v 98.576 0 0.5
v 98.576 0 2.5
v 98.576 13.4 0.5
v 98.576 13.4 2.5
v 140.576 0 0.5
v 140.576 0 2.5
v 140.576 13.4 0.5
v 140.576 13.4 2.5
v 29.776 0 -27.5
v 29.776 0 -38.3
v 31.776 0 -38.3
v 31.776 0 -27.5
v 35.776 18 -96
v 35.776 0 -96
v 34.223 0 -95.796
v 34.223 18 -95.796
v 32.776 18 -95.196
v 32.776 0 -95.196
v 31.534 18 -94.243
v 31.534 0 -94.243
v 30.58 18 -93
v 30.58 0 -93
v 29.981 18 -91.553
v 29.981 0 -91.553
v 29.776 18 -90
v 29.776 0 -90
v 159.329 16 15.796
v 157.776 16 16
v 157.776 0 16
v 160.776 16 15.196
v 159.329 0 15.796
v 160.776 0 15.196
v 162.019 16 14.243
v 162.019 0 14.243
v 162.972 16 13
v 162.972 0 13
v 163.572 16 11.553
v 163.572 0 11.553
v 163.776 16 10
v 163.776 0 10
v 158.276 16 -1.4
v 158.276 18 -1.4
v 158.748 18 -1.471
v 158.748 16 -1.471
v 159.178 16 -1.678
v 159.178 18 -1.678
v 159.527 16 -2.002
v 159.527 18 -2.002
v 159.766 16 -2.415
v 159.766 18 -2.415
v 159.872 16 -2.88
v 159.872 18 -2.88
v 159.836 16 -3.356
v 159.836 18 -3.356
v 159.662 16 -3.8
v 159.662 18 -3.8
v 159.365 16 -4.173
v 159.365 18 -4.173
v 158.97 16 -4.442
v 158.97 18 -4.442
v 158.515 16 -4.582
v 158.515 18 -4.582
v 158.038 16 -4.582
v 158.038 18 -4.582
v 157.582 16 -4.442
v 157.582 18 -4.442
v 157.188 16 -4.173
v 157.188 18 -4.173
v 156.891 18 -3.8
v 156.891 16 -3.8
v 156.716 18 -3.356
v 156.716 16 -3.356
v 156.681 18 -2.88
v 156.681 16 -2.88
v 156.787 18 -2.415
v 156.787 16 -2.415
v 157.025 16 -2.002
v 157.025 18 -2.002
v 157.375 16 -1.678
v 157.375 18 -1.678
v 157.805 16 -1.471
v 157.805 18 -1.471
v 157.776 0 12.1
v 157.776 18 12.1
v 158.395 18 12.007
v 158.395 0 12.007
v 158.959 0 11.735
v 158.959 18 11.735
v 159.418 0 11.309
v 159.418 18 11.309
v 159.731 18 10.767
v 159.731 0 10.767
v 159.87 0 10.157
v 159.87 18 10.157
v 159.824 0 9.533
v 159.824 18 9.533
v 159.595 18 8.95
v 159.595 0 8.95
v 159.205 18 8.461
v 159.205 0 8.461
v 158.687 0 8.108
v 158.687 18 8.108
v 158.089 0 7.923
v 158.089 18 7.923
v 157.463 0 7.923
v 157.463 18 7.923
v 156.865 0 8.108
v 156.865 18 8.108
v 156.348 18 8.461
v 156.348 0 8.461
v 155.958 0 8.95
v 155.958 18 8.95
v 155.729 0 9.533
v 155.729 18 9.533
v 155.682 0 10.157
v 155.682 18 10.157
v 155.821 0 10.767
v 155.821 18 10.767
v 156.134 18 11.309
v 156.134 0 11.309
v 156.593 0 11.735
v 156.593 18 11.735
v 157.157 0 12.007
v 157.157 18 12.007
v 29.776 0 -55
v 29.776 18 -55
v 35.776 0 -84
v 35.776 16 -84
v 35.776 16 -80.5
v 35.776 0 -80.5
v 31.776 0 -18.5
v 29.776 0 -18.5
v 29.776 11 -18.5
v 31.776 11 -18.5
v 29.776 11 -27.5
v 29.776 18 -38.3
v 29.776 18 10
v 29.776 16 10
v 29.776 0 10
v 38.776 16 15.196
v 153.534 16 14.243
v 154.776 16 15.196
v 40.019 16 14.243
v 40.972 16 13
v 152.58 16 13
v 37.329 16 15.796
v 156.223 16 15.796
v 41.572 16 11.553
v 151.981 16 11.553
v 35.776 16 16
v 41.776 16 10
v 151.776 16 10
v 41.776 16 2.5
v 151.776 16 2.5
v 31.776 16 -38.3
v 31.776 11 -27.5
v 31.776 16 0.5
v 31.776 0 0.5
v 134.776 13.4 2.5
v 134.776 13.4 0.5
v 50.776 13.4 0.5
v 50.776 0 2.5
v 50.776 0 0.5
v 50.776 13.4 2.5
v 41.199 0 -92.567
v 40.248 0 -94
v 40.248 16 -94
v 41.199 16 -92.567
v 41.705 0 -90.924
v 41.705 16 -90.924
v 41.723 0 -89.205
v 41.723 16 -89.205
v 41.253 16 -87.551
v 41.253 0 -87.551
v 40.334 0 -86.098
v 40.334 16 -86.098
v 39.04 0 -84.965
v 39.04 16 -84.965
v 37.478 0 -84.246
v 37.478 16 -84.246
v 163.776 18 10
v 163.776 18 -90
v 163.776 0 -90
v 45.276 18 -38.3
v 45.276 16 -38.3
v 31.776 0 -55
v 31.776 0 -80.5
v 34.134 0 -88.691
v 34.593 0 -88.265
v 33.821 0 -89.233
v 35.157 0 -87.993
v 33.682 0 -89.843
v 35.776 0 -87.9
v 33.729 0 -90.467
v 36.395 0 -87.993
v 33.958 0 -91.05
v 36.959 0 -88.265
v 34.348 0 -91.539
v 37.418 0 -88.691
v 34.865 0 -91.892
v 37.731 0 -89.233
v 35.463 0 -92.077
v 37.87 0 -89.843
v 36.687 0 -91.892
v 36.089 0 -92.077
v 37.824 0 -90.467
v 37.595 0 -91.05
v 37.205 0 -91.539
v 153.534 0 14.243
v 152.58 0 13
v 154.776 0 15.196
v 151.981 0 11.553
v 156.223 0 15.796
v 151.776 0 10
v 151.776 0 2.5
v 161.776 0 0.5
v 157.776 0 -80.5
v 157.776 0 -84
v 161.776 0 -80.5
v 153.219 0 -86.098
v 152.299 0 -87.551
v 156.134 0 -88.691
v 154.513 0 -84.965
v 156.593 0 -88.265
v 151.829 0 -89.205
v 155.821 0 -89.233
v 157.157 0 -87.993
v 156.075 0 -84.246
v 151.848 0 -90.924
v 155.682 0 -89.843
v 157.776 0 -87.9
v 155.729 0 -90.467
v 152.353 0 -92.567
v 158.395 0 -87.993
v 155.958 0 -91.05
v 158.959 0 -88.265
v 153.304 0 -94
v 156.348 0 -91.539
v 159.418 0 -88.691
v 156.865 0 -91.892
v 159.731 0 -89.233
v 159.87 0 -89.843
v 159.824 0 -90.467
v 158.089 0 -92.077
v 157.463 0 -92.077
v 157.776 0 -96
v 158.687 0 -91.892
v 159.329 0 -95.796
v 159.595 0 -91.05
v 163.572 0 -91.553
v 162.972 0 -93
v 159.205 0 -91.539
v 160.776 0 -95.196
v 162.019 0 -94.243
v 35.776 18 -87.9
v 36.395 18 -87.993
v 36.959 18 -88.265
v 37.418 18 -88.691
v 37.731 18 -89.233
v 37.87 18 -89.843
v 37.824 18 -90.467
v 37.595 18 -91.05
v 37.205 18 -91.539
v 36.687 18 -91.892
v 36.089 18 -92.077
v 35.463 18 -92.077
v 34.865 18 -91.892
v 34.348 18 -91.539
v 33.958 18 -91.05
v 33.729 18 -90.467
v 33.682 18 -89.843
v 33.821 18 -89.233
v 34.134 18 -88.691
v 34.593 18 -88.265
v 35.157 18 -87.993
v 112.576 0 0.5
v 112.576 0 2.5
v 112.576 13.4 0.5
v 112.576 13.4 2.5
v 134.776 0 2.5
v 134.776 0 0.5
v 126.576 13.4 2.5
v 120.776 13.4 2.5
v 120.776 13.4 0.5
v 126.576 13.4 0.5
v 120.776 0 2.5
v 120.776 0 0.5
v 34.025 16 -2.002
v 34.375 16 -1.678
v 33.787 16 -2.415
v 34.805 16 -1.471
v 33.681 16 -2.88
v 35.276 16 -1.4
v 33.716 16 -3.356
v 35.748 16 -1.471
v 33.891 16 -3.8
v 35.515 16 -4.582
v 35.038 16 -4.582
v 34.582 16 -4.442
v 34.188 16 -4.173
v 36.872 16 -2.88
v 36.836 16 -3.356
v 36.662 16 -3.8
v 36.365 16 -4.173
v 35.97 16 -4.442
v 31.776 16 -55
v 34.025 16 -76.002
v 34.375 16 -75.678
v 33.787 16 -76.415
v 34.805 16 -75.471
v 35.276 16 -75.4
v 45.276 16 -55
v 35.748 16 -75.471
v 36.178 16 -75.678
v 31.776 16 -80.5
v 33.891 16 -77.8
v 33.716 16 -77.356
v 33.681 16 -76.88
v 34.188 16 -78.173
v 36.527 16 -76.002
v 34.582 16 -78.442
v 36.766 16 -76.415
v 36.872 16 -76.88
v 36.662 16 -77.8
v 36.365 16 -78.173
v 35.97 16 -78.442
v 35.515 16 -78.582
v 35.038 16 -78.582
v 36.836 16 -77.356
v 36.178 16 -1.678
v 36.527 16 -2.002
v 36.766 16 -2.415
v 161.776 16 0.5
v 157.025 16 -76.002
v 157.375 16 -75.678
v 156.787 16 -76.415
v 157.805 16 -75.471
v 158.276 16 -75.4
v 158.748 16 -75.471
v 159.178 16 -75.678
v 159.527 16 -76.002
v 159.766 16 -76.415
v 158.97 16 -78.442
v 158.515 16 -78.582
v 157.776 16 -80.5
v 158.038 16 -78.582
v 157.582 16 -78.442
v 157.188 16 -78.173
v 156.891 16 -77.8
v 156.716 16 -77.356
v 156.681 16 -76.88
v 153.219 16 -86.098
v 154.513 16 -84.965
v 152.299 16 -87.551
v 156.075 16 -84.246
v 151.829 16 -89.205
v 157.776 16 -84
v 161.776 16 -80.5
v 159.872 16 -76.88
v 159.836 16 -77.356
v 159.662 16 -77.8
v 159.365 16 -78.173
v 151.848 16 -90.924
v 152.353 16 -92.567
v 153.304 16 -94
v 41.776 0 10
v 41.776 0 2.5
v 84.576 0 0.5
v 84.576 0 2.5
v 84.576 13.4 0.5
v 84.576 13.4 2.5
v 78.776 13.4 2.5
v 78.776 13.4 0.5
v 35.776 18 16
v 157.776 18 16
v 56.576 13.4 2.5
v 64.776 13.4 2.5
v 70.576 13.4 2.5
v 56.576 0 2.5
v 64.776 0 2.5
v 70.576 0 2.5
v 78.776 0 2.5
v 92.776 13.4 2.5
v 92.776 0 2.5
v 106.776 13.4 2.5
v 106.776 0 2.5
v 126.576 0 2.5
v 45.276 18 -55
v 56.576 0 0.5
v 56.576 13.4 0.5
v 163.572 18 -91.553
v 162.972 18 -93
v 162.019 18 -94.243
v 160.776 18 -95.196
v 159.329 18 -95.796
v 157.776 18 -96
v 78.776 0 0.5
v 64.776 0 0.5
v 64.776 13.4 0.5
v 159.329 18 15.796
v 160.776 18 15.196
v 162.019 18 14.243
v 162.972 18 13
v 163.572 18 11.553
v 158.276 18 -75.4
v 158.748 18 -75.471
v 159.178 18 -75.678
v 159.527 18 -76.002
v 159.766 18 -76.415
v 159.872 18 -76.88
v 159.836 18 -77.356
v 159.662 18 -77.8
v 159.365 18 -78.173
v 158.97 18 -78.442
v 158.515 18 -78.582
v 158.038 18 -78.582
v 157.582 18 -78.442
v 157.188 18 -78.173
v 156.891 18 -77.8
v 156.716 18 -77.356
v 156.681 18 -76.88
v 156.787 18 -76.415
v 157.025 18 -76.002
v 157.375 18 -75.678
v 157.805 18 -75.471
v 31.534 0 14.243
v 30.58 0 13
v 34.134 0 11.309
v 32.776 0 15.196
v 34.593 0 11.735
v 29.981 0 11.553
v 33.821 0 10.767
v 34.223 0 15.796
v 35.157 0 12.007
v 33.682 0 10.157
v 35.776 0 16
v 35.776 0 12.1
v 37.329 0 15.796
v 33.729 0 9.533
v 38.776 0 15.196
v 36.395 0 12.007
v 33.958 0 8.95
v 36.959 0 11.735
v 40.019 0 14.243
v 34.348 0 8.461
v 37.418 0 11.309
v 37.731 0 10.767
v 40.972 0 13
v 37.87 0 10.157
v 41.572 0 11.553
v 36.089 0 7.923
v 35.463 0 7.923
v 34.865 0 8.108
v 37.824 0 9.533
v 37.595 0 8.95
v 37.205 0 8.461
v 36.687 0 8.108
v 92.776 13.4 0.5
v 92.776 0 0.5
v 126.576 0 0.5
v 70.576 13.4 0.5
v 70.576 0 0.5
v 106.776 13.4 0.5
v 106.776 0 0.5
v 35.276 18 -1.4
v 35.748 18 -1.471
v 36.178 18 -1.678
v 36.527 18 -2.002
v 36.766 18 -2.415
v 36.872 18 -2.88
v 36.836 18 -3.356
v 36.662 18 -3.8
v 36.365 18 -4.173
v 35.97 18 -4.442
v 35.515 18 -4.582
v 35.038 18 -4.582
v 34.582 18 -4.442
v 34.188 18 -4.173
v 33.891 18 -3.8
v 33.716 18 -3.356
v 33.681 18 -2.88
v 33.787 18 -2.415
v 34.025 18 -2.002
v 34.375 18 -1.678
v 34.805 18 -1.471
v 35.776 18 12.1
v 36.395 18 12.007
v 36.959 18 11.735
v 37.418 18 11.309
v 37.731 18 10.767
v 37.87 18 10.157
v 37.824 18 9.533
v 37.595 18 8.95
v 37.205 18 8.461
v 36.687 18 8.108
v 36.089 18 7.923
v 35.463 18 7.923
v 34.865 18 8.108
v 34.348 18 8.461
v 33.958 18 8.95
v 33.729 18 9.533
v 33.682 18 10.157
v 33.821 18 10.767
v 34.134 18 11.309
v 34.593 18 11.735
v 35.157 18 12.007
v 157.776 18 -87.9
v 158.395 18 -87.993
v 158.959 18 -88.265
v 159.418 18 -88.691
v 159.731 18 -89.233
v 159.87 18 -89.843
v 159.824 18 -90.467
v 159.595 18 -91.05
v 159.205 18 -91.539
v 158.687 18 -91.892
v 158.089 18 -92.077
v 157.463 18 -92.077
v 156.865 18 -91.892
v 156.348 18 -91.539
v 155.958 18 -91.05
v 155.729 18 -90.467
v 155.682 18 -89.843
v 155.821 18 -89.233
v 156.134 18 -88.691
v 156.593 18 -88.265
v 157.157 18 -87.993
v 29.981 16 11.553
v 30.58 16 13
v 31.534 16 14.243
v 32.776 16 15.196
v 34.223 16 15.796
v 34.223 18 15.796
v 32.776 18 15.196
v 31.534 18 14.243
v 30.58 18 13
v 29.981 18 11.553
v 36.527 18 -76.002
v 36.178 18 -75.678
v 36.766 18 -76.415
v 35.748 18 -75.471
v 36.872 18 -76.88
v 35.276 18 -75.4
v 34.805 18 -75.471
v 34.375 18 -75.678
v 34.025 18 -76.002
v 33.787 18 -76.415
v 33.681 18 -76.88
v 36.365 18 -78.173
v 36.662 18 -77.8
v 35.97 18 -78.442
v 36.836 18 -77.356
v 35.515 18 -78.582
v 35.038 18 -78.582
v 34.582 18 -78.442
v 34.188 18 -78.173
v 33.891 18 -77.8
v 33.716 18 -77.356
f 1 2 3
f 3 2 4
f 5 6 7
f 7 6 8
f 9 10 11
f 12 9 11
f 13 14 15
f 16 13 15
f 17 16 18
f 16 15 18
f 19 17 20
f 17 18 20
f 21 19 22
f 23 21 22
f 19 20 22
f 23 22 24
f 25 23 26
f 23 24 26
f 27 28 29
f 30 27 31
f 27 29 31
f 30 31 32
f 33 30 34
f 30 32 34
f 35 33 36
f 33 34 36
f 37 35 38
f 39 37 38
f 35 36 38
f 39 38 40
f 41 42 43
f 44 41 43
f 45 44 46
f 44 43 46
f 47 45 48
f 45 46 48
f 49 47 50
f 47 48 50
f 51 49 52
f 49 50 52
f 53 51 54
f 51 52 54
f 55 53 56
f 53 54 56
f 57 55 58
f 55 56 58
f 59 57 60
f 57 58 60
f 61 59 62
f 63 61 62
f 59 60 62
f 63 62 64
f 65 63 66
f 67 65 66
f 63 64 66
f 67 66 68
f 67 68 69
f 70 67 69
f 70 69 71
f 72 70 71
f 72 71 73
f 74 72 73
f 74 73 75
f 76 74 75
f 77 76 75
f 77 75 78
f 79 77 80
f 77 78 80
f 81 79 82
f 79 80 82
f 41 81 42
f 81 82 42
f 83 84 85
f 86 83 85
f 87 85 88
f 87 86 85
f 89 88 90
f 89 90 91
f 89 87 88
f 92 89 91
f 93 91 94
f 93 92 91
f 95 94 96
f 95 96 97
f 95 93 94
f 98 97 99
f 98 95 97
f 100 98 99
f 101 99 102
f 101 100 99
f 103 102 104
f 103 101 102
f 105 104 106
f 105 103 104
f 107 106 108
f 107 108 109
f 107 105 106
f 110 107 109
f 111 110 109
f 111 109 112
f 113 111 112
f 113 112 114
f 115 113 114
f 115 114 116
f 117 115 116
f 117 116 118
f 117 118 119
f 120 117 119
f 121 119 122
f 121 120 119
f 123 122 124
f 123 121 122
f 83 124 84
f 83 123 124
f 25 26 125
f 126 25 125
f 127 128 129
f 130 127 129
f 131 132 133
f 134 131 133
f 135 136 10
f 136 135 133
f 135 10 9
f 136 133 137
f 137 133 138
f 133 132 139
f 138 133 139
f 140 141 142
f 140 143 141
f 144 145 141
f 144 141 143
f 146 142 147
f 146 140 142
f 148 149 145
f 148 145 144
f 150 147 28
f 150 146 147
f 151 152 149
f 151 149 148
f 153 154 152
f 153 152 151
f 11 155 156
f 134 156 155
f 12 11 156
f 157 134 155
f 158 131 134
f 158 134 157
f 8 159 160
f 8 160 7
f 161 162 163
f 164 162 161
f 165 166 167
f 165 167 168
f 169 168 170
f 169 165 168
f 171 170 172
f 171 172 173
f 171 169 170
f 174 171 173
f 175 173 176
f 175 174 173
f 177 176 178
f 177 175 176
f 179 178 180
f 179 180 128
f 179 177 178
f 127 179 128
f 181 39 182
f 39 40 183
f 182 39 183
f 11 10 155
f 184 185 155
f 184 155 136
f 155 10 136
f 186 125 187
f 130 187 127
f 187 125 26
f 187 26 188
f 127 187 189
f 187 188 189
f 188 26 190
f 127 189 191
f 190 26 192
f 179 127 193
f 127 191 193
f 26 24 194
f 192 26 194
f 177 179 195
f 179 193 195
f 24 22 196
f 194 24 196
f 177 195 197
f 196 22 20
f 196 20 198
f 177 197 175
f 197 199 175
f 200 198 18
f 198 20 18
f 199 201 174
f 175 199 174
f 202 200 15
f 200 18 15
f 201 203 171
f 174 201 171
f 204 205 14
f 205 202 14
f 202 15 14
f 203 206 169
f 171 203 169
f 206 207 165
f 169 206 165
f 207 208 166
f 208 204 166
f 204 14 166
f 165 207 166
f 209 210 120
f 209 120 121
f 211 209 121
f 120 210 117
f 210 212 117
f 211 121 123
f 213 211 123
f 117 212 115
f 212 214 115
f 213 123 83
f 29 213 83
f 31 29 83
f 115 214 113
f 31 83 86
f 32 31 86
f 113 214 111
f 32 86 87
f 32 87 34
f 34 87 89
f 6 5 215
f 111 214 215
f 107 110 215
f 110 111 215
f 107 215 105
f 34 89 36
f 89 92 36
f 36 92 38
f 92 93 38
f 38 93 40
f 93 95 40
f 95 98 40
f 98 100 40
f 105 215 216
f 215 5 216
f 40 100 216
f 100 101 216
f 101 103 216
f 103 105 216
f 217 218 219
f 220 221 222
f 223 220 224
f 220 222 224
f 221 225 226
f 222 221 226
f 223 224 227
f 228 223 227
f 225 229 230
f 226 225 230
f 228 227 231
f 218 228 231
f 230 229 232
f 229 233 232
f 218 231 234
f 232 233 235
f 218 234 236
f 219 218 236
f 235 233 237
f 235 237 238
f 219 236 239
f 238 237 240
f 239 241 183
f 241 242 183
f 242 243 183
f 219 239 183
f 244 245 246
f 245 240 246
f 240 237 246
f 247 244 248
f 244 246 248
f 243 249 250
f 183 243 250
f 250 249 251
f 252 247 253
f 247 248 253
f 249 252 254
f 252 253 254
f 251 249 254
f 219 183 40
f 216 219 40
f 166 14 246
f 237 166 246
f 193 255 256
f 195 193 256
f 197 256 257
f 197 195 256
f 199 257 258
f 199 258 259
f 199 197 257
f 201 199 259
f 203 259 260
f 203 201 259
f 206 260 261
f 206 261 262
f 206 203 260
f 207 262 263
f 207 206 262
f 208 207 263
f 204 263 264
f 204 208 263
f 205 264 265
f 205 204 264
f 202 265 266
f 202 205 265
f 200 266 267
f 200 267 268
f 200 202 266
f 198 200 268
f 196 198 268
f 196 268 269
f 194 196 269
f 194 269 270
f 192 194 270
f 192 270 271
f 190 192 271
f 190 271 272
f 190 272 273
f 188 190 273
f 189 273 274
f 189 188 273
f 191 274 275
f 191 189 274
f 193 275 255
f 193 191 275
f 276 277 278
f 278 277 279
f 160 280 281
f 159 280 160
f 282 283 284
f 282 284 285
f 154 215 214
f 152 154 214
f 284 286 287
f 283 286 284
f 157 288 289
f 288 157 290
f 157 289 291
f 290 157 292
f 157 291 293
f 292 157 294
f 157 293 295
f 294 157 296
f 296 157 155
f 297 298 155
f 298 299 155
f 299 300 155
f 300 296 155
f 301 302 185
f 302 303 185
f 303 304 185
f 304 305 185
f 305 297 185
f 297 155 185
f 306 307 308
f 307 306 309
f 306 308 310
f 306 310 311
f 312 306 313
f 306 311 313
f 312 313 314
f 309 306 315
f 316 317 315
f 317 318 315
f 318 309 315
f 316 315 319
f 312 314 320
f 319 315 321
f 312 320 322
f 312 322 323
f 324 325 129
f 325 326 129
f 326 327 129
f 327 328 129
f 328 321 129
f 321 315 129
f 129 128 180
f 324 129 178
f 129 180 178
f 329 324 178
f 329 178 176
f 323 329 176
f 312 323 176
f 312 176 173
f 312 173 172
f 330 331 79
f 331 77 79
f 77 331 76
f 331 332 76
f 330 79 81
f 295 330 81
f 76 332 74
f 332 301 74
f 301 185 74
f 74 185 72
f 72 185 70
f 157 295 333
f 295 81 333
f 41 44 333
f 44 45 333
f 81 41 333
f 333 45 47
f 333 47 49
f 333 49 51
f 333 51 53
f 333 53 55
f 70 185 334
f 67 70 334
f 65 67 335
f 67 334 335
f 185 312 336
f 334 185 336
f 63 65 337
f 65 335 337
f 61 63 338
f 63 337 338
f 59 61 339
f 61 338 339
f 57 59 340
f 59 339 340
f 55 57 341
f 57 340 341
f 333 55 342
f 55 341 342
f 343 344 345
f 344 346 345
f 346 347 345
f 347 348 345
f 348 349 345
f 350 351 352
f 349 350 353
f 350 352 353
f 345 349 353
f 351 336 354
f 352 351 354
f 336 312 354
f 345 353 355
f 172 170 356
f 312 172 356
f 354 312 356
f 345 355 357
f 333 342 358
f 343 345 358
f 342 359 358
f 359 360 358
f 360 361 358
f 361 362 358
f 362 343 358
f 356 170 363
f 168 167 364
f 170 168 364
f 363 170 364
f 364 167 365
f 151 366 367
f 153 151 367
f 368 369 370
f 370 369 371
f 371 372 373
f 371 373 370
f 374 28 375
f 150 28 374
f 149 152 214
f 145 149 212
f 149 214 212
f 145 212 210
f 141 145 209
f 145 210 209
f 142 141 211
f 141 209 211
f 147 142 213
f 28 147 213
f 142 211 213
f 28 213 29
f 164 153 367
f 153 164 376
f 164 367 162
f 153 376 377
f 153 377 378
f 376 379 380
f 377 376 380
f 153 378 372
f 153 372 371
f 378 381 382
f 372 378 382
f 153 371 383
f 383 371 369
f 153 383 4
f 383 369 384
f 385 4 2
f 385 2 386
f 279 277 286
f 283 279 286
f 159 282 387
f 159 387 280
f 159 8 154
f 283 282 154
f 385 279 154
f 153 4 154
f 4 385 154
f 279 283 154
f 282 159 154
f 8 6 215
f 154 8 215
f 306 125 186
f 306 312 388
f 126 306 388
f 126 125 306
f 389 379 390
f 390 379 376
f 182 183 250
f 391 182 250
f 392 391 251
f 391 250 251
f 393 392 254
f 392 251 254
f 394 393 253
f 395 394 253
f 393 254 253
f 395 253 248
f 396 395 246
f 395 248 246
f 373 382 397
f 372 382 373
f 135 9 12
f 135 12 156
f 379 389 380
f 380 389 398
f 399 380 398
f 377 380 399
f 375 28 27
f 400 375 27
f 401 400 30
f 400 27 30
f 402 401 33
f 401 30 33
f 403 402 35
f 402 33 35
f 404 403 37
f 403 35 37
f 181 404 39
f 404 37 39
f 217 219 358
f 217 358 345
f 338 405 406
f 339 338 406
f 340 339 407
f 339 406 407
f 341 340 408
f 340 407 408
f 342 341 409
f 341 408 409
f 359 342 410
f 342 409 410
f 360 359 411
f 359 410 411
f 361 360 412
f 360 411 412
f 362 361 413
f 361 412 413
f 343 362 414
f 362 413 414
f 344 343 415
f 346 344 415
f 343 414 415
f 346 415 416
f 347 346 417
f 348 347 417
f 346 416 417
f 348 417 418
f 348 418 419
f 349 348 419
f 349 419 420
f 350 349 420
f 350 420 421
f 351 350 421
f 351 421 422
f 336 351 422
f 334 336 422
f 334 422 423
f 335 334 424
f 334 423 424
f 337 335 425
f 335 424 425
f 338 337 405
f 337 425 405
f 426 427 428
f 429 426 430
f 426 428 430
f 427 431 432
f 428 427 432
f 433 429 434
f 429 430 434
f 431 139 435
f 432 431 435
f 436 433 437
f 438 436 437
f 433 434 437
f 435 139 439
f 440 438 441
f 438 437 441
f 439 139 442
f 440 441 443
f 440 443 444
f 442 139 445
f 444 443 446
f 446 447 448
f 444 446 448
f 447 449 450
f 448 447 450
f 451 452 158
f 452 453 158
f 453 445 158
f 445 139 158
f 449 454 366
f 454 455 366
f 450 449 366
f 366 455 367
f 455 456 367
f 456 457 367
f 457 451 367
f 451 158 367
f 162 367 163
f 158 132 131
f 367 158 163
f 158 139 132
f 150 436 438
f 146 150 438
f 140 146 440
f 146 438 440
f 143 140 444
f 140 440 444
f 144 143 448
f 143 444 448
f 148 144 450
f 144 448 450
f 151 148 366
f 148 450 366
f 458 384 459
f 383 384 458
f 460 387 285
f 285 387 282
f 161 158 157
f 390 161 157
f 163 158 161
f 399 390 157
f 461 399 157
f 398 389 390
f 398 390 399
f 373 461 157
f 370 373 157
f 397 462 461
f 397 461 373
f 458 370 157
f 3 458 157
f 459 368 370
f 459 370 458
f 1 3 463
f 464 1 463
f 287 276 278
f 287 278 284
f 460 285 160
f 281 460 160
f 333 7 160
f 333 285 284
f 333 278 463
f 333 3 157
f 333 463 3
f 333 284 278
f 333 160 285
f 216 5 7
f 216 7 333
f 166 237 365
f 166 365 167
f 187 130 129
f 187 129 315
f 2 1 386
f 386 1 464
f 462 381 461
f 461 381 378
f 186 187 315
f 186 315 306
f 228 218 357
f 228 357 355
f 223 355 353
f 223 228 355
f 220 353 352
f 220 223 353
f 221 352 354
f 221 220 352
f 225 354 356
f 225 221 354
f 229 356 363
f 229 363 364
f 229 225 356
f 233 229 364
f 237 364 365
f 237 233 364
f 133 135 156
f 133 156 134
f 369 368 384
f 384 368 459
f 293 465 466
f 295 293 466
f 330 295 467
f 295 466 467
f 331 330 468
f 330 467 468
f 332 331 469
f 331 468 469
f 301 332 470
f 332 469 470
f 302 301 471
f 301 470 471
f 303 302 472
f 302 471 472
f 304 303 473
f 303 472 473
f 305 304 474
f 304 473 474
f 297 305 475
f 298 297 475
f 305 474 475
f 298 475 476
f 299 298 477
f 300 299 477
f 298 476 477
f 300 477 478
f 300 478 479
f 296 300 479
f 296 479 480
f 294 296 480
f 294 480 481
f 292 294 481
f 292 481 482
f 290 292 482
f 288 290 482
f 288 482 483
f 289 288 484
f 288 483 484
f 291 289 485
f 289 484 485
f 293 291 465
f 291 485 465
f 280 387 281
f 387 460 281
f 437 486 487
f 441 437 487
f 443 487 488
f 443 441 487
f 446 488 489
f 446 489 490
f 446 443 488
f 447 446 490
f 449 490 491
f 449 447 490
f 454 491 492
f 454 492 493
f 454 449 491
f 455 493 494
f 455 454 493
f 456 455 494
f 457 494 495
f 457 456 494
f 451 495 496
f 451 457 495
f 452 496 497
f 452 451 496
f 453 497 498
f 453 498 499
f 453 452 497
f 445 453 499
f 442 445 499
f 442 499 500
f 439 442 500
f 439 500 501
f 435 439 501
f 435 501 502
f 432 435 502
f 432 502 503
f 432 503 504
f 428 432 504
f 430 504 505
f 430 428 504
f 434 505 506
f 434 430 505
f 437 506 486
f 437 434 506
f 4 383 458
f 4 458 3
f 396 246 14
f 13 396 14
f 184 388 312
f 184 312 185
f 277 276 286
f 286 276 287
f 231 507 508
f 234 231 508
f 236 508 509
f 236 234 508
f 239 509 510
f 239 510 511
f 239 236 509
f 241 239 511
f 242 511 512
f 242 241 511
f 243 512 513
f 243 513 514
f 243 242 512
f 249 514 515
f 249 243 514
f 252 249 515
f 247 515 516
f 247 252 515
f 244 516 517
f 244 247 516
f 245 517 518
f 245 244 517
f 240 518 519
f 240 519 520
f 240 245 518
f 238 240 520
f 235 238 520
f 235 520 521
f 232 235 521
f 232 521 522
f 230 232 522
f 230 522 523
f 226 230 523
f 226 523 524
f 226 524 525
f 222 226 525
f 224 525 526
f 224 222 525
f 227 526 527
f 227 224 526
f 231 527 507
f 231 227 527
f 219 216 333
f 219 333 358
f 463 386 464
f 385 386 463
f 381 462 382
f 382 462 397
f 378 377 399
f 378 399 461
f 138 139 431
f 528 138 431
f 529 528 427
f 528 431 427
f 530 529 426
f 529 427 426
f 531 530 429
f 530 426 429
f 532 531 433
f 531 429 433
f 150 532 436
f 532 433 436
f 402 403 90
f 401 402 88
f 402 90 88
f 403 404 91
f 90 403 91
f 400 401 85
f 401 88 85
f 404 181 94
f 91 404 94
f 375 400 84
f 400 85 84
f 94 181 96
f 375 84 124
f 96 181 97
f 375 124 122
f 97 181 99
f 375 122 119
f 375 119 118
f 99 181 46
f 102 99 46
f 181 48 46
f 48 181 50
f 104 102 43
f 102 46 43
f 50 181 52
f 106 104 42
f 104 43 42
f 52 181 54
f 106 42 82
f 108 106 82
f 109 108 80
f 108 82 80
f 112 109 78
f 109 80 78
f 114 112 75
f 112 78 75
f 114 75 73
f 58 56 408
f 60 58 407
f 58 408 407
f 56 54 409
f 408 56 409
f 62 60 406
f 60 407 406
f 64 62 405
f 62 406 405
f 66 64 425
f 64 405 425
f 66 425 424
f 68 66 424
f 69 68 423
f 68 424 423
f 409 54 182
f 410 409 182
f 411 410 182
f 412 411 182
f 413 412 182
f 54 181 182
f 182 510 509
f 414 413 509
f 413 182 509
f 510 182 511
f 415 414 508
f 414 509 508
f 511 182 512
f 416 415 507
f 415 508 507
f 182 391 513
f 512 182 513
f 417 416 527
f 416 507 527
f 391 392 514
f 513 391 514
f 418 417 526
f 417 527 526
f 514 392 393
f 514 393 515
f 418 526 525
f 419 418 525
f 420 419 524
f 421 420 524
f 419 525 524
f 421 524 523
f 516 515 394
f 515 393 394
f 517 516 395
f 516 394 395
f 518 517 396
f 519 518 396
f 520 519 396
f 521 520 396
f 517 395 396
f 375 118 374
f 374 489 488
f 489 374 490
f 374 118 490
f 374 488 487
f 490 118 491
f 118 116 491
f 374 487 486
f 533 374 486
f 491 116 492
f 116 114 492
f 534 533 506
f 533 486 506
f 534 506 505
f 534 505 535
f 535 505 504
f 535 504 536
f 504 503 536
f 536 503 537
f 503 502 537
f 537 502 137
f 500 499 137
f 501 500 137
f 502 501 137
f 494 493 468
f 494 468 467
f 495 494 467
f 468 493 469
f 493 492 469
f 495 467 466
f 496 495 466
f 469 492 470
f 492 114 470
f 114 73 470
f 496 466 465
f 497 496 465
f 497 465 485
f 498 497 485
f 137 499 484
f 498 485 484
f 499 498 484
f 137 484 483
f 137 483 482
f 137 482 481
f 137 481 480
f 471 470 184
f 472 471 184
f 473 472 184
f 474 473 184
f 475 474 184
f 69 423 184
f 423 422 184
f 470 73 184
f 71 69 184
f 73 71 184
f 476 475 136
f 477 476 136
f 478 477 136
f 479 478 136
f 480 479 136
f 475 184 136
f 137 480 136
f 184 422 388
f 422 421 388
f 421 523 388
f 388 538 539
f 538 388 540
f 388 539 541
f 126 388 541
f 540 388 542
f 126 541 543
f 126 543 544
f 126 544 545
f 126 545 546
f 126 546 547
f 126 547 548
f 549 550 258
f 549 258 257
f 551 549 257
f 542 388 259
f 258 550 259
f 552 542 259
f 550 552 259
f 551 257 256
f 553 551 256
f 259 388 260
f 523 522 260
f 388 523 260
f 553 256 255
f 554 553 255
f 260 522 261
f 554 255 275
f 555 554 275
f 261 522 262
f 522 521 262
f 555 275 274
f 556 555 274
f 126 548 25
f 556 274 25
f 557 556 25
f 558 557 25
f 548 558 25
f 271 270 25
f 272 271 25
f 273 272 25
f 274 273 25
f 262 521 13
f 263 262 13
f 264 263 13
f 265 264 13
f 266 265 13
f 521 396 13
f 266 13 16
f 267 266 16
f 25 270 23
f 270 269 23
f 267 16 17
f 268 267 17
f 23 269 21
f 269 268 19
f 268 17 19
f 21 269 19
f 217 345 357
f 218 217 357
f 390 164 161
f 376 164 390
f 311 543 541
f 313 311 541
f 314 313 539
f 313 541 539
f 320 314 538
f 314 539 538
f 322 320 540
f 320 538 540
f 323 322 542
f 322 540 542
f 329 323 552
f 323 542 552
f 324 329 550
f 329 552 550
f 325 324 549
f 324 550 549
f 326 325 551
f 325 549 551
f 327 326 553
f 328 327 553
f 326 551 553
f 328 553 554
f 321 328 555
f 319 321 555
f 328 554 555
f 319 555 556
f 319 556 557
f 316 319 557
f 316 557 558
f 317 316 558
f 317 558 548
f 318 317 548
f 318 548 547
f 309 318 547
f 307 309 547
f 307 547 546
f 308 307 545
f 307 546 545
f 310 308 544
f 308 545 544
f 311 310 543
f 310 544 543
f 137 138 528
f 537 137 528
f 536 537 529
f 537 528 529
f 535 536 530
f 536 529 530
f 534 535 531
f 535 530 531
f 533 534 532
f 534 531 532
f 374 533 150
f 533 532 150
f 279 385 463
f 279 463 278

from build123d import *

# Parameters (mm, degrees)
SKETCH_1_R          = 2.1
EXTRUDE_1_DEPTH     = 16
SKETCH_2_R          = 2.1
EXTRUDE_2_DEPTH     = 2
EXTRUDE_START       = -2
EXTRUDE_3_DEPTH     = 2
SKETCH_4_W          = 5.8
SKETCH_4_H          = 13.4
CUT_EXTRUDE_1_DEPTH = 2
SKETCH_5_W          = 9
SKETCH_5_H          = 11
CUT_EXTRUDE_2_DEPTH = 2
SKETCH_6_W          = 16.7
SKETCH_6_H          = 18
CUT_EXTRUDE_3_DEPTH = 15.5
SKETCH_7_R          = 1.6
CUT_EXTRUDE_4_DEPTH = 2


with BuildPart() as part:
    # 草图1 → 凸台-拉伸1 (new body)
    with BuildSketch(Plane(origin=(0, 0, 0), x_dir=(1, 0, 0), z_dir=(0, 1, 0))):
        with BuildLine():
            Line((41.776260997, -10), (41.776260997, -2.5))
            Line((41.776260997, -2.5), (151.776260997, -2.5))
            Line((151.776260997, -2.5), (151.776260997, -10))
            ThreePointArc((151.776260997, -10), (153.53362031, -14.242640687), (157.776260997, -16))
            ThreePointArc((157.776260997, -16), (162.018901684, -14.242640687), (163.776260997, -10))
            Line((163.776260997, -10), (163.776260997, 90))
            ThreePointArc((163.776260997, 90), (162.018901684, 94.242640687), (157.776260997, 96))
            Line((157.776260997, 96), (35.776260997, 96))
            ThreePointArc((35.776260997, 96), (31.53362031, 94.242640687), (29.776260997, 90))
            Line((29.776260997, 90), (29.776260997, -10))
            ThreePointArc((29.776260997, -10), (31.53362031, -14.242640687), (35.776260997, -16))
            ThreePointArc((35.776260997, -16), (40.018901684, -14.242640687), (41.776260997, -10))
        make_face()
        with Locations(Location((35.776260997, -10, 0), (0, 0, 270))):
            Circle(SKETCH_1_R, mode=Mode.SUBTRACT)
        with Locations(Location((35.776260997, 90, 0), (0, 0, 270))):
            Circle(SKETCH_1_R, mode=Mode.SUBTRACT)
        with Locations(Location((157.776260997, 90, 0), (0, 0, 270))):
            Circle(SKETCH_1_R, mode=Mode.SUBTRACT)
        with Locations(Location((157.776260997, -10, 0), (0, 0, 270))):
            Circle(SKETCH_1_R, mode=Mode.SUBTRACT)
        with BuildLine():
            Line((31.776260997, -0.5), (161.776260997, -0.5))
            Line((161.776260997, -0.5), (161.776260997, 80.5))
            Line((161.776260997, 80.5), (157.776260997, 80.5))
            Line((157.776260997, 80.5), (157.776260997, 84))
            ThreePointArc((157.776260997, 84), (152.299035422, 87.550510257), (153.304125042, 94))
            Line((153.304125042, 94), (96.776260997, 94))
            Line((96.776260997, 94), (40.248396952, 94))
            ThreePointArc((40.248396952, 94), (41.253486572, 87.550510257), (35.776260997, 84))
            Line((35.776260997, 84), (35.776260997, 80.5))
            Line((35.776260997, 80.5), (31.776260997, 80.5))
            Line((31.776260997, 80.5), (31.776260997, -0.5))
        make_face(mode=Mode.SUBTRACT)
    extrude(amount=EXTRUDE_1_DEPTH)

    # 草图2 → 凸台-拉伸2 (add)
    with BuildSketch(Plane(origin=(0, 16, 0), x_dir=(1, 0, 0), z_dir=(0, 1, 0))):
        with BuildLine():
            Line((29.776260997, 90), (29.776260997, -10))
            ThreePointArc((29.776260997, -10), (35.776260997, -16), (41.776260997, -10))
            Line((41.776260997, -10), (41.776260997, -2.5))
            Line((41.776260997, -2.5), (151.776260997, -2.5))
            Line((151.776260997, -2.5), (151.776260997, -10))
            ThreePointArc((151.776260997, -10), (157.776260997, -16), (163.776260997, -10))
            Line((163.776260997, -10), (163.776260997, 90))
            ThreePointArc((163.776260997, 90), (162.018901684, 94.242640687), (157.776260997, 96))
            Line((157.776260997, 96), (35.776260997, 96))
            ThreePointArc((35.776260997, 96), (31.53362031, 94.242640687), (29.776260997, 90))
        make_face()
        with Locations(Location((35.776260997, 90, 0), (0, 0, 270))):
            Circle(SKETCH_2_R, mode=Mode.SUBTRACT)
        with Locations(Location((157.776260997, 90, 0), (0, 0, 270))):
            Circle(SKETCH_2_R, mode=Mode.SUBTRACT)
        with Locations(Location((35.776260997, -10, 0), (0, 0, 270))):
            Circle(SKETCH_2_R, mode=Mode.SUBTRACT)
        with Locations(Location((157.776260997, -10, 0), (0, 0, 270))):
            Circle(SKETCH_2_R, mode=Mode.SUBTRACT)
    extrude(amount=EXTRUDE_2_DEPTH)

    # 草图3 → 凸台-拉伸3 (add)
    with BuildSketch(Plane(origin=(0, 18, 0), x_dir=(1, 0, 0), z_dir=(0, 1, 0)).offset(EXTRUDE_START)):
        with BuildLine():
            Line((41.776260997, -2.5), (151.776260997, -2.5))
            Line((151.776260997, -2.5), (151.776260997, -10))
            ThreePointArc((151.776260997, -10), (153.53362031, -14.242640687), (157.776260997, -16))
            Line((157.776260997, -16), (35.776260997, -16))
            ThreePointArc((35.776260997, -16), (40.018901684, -14.242640687), (41.776260997, -10))
            Line((41.776260997, -10), (41.776260997, -2.5))
        make_face()
    extrude(amount=EXTRUDE_3_DEPTH)

    # 草图4 → 切除-拉伸1 (cut)
    with BuildSketch(Plane.XY.offset(2.5)):
        with Locations((67.676260997, 6.7)):
            Rectangle(SKETCH_4_W, SKETCH_4_H)
        with Locations((53.676260997, 6.7)):
            Rectangle(SKETCH_4_W, SKETCH_4_H)
        with Locations((81.676260997, 6.7)):
            Rectangle(SKETCH_4_W, SKETCH_4_H)
        with Locations((95.676260997, 6.7)):
            Rectangle(SKETCH_4_W, SKETCH_4_H)
        with Locations((109.676260997, 6.7)):
            Rectangle(SKETCH_4_W, SKETCH_4_H)
        with Locations((123.676260997, 6.7)):
            Rectangle(SKETCH_4_W, SKETCH_4_H)
        with Locations((137.676260997, 6.7)):
            Rectangle(SKETCH_4_W, SKETCH_4_H)
    extrude(amount=-CUT_EXTRUDE_1_DEPTH, mode=Mode.SUBTRACT)

    # 草图5 → 切除-拉伸2 (cut)
    with BuildSketch(Plane.ZY.offset(-29.776260997)):
        with Locations((-23, 5.5)):
            Rectangle(SKETCH_5_W, SKETCH_5_H)
    extrude(amount=-CUT_EXTRUDE_2_DEPTH, mode=Mode.SUBTRACT)

    # 草图6 → 切除-拉伸3 (cut)
    with BuildSketch(Plane.ZY.offset(-29.776260997)):
        with Locations((-46.65, 9)):
            Rectangle(SKETCH_6_W, SKETCH_6_H)
    extrude(amount=-CUT_EXTRUDE_3_DEPTH, mode=Mode.SUBTRACT)

    # 草图7 → 切除-拉伸4 (cut)
    with BuildSketch(Plane(origin=(0, 18, 0), x_dir=(1, 0, 0), z_dir=(0, 1, 0))):
        with Locations(Location((158.276260997, 77, 0), (0, 0, 270))):
            Circle(SKETCH_7_R)
        with Locations(Location((35.276260997, 77, 0), (0, 0, 270))):
            Circle(SKETCH_7_R)
        with Locations(Location((35.276260997, 3, 0), (0, 0, 270))):
            Circle(SKETCH_7_R)
        with Locations(Location((158.276260997, 3, 0), (0, 0, 270))):
            Circle(SKETCH_7_R)
    extrude(amount=-CUT_EXTRUDE_4_DEPTH, mode=Mode.SUBTRACT)


solid = part.part
